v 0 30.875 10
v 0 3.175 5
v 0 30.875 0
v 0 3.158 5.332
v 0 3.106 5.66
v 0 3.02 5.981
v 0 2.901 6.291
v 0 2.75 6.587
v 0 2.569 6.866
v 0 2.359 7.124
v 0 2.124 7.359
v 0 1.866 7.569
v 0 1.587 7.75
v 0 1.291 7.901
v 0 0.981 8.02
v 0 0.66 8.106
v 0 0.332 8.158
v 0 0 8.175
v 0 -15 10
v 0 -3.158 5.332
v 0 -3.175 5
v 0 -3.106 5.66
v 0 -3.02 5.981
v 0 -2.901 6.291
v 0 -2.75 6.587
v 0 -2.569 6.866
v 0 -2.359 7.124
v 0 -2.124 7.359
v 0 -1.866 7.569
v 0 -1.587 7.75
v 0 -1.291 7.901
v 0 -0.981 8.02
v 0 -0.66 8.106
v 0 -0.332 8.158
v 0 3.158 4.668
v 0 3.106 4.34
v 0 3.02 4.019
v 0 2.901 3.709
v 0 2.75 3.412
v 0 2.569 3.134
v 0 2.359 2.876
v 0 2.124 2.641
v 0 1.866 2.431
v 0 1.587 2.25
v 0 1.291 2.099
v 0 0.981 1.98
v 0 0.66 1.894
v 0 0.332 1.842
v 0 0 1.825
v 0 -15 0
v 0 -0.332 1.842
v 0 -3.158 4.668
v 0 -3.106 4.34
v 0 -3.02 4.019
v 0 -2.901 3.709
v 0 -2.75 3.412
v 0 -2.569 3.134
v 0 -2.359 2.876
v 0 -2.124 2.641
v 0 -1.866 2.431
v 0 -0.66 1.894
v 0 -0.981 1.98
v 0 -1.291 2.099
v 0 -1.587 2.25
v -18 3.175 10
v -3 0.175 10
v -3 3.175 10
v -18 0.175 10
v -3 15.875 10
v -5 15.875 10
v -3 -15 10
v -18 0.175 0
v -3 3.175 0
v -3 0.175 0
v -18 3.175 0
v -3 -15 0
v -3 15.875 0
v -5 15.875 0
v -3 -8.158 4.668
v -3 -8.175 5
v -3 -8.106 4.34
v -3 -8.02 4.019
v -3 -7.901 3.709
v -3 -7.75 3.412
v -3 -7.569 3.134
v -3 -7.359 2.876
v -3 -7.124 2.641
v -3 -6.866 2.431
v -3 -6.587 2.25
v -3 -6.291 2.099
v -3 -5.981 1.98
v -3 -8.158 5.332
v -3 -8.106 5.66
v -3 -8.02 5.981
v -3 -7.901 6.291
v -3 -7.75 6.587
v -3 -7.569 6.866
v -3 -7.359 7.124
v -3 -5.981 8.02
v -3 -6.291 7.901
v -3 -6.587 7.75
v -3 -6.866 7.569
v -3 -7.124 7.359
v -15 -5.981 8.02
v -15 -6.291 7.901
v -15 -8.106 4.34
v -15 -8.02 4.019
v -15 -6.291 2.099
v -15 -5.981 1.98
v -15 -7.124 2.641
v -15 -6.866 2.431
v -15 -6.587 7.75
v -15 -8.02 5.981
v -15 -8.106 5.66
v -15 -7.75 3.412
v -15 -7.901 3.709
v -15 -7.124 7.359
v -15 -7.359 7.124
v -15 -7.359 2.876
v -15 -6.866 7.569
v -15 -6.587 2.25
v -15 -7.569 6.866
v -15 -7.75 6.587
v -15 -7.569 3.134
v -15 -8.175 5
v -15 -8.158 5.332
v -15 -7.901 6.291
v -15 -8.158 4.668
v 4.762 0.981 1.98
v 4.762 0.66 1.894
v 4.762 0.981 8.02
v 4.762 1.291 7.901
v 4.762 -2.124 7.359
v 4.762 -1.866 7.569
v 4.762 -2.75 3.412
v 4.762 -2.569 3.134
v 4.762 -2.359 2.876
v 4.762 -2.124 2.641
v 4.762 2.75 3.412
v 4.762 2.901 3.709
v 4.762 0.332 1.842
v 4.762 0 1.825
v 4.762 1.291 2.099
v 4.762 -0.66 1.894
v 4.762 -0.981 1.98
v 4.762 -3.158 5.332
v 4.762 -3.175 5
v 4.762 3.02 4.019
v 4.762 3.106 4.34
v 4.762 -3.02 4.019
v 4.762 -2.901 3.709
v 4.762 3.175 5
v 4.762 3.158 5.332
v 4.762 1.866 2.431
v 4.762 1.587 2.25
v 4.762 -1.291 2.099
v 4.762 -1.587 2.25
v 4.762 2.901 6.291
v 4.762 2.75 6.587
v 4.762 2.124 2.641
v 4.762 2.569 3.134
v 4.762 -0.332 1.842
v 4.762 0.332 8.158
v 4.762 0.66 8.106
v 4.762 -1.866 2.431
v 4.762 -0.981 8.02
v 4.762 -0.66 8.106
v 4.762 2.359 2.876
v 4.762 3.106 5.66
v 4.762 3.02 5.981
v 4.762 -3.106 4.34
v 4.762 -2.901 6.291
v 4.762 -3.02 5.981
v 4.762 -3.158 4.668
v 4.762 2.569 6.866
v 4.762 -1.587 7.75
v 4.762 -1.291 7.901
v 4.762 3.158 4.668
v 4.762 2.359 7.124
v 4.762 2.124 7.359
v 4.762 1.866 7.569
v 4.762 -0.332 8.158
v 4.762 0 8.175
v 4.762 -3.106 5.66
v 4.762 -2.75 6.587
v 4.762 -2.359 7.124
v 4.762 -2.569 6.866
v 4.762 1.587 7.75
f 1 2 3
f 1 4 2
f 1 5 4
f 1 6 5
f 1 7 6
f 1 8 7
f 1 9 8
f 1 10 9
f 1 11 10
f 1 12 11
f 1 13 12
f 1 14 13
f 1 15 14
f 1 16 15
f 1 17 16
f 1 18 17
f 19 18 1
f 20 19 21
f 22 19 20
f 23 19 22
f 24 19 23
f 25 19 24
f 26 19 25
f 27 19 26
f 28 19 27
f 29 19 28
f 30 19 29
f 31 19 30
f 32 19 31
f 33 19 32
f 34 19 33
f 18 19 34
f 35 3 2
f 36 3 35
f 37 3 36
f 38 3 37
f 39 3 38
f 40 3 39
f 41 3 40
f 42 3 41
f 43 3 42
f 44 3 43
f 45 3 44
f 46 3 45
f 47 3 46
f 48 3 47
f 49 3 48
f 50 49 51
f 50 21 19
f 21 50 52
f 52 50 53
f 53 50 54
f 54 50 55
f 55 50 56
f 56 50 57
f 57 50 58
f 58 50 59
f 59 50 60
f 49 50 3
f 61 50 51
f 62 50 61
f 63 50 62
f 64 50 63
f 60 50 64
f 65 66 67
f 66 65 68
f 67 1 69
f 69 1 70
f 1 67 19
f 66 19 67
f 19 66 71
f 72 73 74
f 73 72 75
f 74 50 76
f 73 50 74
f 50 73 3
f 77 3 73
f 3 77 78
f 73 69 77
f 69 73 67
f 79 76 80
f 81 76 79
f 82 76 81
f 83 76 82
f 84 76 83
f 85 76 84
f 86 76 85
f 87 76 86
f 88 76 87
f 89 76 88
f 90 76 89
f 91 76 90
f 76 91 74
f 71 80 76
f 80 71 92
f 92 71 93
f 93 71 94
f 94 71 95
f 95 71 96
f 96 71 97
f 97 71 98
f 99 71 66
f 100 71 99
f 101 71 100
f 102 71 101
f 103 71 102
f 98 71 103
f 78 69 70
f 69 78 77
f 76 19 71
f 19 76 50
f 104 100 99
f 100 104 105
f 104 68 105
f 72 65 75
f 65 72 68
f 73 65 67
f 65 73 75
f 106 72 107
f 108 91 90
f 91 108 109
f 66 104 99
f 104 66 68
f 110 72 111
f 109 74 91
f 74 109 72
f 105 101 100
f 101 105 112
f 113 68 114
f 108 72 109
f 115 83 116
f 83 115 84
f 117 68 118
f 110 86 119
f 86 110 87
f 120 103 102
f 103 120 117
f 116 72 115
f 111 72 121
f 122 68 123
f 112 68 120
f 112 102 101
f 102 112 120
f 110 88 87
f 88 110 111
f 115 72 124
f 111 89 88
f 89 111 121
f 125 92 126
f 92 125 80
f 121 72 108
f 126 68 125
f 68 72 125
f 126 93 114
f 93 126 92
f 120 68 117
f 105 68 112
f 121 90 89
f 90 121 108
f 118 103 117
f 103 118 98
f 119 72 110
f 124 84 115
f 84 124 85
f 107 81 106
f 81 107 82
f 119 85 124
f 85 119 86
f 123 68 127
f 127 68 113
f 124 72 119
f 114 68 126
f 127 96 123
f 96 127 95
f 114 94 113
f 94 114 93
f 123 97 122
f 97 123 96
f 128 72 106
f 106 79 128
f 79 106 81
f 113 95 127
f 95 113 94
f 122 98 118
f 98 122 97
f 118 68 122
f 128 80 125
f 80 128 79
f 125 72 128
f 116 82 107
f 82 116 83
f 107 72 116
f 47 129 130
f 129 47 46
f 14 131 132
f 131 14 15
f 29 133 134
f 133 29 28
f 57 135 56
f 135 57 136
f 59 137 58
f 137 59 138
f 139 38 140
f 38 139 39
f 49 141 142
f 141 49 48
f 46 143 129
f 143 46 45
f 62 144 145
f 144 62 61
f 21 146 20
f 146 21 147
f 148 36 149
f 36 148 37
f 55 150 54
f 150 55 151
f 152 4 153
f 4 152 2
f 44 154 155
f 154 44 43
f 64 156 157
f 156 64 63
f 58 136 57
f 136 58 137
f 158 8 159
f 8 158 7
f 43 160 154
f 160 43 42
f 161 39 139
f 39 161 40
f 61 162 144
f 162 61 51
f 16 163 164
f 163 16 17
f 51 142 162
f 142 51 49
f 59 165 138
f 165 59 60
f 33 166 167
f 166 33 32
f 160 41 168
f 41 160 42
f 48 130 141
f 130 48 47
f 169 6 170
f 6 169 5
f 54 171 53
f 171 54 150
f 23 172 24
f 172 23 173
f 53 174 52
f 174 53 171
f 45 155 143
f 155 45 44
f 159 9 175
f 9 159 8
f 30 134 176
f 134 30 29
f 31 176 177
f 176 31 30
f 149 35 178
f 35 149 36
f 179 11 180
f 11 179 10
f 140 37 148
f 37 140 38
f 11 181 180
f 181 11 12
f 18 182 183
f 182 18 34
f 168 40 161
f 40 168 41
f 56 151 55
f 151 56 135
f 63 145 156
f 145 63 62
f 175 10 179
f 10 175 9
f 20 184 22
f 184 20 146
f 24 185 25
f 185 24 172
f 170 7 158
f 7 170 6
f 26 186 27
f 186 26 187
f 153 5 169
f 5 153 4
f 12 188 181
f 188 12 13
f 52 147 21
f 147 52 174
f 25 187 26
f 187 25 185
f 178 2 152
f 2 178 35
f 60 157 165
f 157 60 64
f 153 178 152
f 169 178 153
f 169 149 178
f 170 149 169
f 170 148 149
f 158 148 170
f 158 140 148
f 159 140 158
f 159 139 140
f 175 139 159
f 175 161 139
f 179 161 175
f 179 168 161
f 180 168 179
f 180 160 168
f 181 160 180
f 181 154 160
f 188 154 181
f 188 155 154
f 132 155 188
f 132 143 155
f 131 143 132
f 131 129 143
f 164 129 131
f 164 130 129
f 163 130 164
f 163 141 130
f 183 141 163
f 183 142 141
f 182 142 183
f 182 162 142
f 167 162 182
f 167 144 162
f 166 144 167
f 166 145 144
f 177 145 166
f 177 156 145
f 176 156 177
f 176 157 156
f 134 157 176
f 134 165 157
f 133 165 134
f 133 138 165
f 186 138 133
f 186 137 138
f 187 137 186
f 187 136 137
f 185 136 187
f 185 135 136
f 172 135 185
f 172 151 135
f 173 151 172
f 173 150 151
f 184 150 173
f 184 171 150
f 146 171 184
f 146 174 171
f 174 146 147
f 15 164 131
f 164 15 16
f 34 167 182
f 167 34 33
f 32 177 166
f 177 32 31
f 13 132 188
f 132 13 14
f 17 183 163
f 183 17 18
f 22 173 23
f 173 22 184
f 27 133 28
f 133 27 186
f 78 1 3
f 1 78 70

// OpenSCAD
// by Hank Cowdog
// 17 Jan 2018
// changes by ALittleSlow for version 2.1
// 18 Dec 2018
// * made pin length parametric
// * fixed parameter ranges to work better with customizer
//
// GNU General Public License, version 2
// http://www.gnu.org/licenses/gpl-2.0.html

// public-facing measurements are in Imperial (e.g. inches)
// Internally, mm are used

//pin thickness, inches
PinDiameterInches		= 0.25;   			//[0.0:0.05:0.75]

//Shelf Thickness,, in 1/16th inch increments
ShelfThicknessFracInches = 8;   //[1:1:16]

//pin length, inches
PinLength = 0.1875;
//
// No editing needed beyond this point
//

// pin is always 5mm
PinLengthMM = PinLength*25.4;

PinDiameterMM = PinDiameterInches*25.4;
PinRadiusMM = PinDiameterMM/2.0;

ShelfThicknessMM  = ShelfThicknessFracInches/16.0*25.4;

VertThicknessMM = 3.0*1;
HorBracketThicknessMM = 3.0*1;
HorBracketLengthMM = 15.0*1.0;
LengthBelowShelfMM = HorBracketLengthMM;

WedgeHeightMM = 15*1;
BarbThicknessMM=2*1;

Fudge =0.0000001*1;  //fudge factor to avoid 3D artifacts at edges when previewing

VertLengthMM = LengthBelowShelfMM + PinRadiusMM + ShelfThicknessMM + Fudge;

// Allow a small edge beyond the pin size, mostly for looks
PinOffsetMM = 1.0*1;

// at least 10mm high on print bed, even if very small pin
BracketHeightMM = max(PinDiameterMM + PinOffsetMM*2.0,10.0);

union() {
    
    //Draw the Vertical Support
    translate([-VertThicknessMM,-LengthBelowShelfMM,0])
    cube([VertThicknessMM,VertLengthMM,BracketHeightMM]);
    
    //Draw the Horizontal Support
    // using hull makes a nice transition from round bottom to flat top
    hull(){
    translate([Fudge-HorBracketLengthMM-VertThicknessMM,PinRadiusMM-HorBracketThicknessMM,0])
        cube([HorBracketLengthMM,HorBracketThicknessMM,BracketHeightMM]);
    
    translate([-HorBracketLengthMM-Fudge, -BracketHeightMM/2.0,BracketHeightMM/2.0])
        rotate([0,90,00]) cylinder(h=HorBracketLengthMM,r=PinRadiusMM,$fn=60);
    }
    
    // Draw the Pin
    translate([0, -Fudge,BracketHeightMM/2.0])
    rotate([0,90,00])cylinder(h=PinLengthMM,r=PinRadiusMM,$fn=60);
    
    
    // Draw the Wedge  - this sits above the shelf to hold it in place
    // using a wedge shape makes it easier to drop the shelf down onto
    // the bracket when installing
    translate([Fudge-VertThicknessMM-BarbThicknessMM,PinRadiusMM+ShelfThicknessMM,0]){
       // cube([WedgeThicknessMM,WedgeHeightMM,BracketHeightMM]);
       linear_extrude(height=BracketHeightMM)
       polygon(points=[
                     [0,0],
                     [BarbThicknessMM+VertThicknessMM,WedgeHeightMM],
                     [BarbThicknessMM+VertThicknessMM,0]
                     ]);        
    }
}
